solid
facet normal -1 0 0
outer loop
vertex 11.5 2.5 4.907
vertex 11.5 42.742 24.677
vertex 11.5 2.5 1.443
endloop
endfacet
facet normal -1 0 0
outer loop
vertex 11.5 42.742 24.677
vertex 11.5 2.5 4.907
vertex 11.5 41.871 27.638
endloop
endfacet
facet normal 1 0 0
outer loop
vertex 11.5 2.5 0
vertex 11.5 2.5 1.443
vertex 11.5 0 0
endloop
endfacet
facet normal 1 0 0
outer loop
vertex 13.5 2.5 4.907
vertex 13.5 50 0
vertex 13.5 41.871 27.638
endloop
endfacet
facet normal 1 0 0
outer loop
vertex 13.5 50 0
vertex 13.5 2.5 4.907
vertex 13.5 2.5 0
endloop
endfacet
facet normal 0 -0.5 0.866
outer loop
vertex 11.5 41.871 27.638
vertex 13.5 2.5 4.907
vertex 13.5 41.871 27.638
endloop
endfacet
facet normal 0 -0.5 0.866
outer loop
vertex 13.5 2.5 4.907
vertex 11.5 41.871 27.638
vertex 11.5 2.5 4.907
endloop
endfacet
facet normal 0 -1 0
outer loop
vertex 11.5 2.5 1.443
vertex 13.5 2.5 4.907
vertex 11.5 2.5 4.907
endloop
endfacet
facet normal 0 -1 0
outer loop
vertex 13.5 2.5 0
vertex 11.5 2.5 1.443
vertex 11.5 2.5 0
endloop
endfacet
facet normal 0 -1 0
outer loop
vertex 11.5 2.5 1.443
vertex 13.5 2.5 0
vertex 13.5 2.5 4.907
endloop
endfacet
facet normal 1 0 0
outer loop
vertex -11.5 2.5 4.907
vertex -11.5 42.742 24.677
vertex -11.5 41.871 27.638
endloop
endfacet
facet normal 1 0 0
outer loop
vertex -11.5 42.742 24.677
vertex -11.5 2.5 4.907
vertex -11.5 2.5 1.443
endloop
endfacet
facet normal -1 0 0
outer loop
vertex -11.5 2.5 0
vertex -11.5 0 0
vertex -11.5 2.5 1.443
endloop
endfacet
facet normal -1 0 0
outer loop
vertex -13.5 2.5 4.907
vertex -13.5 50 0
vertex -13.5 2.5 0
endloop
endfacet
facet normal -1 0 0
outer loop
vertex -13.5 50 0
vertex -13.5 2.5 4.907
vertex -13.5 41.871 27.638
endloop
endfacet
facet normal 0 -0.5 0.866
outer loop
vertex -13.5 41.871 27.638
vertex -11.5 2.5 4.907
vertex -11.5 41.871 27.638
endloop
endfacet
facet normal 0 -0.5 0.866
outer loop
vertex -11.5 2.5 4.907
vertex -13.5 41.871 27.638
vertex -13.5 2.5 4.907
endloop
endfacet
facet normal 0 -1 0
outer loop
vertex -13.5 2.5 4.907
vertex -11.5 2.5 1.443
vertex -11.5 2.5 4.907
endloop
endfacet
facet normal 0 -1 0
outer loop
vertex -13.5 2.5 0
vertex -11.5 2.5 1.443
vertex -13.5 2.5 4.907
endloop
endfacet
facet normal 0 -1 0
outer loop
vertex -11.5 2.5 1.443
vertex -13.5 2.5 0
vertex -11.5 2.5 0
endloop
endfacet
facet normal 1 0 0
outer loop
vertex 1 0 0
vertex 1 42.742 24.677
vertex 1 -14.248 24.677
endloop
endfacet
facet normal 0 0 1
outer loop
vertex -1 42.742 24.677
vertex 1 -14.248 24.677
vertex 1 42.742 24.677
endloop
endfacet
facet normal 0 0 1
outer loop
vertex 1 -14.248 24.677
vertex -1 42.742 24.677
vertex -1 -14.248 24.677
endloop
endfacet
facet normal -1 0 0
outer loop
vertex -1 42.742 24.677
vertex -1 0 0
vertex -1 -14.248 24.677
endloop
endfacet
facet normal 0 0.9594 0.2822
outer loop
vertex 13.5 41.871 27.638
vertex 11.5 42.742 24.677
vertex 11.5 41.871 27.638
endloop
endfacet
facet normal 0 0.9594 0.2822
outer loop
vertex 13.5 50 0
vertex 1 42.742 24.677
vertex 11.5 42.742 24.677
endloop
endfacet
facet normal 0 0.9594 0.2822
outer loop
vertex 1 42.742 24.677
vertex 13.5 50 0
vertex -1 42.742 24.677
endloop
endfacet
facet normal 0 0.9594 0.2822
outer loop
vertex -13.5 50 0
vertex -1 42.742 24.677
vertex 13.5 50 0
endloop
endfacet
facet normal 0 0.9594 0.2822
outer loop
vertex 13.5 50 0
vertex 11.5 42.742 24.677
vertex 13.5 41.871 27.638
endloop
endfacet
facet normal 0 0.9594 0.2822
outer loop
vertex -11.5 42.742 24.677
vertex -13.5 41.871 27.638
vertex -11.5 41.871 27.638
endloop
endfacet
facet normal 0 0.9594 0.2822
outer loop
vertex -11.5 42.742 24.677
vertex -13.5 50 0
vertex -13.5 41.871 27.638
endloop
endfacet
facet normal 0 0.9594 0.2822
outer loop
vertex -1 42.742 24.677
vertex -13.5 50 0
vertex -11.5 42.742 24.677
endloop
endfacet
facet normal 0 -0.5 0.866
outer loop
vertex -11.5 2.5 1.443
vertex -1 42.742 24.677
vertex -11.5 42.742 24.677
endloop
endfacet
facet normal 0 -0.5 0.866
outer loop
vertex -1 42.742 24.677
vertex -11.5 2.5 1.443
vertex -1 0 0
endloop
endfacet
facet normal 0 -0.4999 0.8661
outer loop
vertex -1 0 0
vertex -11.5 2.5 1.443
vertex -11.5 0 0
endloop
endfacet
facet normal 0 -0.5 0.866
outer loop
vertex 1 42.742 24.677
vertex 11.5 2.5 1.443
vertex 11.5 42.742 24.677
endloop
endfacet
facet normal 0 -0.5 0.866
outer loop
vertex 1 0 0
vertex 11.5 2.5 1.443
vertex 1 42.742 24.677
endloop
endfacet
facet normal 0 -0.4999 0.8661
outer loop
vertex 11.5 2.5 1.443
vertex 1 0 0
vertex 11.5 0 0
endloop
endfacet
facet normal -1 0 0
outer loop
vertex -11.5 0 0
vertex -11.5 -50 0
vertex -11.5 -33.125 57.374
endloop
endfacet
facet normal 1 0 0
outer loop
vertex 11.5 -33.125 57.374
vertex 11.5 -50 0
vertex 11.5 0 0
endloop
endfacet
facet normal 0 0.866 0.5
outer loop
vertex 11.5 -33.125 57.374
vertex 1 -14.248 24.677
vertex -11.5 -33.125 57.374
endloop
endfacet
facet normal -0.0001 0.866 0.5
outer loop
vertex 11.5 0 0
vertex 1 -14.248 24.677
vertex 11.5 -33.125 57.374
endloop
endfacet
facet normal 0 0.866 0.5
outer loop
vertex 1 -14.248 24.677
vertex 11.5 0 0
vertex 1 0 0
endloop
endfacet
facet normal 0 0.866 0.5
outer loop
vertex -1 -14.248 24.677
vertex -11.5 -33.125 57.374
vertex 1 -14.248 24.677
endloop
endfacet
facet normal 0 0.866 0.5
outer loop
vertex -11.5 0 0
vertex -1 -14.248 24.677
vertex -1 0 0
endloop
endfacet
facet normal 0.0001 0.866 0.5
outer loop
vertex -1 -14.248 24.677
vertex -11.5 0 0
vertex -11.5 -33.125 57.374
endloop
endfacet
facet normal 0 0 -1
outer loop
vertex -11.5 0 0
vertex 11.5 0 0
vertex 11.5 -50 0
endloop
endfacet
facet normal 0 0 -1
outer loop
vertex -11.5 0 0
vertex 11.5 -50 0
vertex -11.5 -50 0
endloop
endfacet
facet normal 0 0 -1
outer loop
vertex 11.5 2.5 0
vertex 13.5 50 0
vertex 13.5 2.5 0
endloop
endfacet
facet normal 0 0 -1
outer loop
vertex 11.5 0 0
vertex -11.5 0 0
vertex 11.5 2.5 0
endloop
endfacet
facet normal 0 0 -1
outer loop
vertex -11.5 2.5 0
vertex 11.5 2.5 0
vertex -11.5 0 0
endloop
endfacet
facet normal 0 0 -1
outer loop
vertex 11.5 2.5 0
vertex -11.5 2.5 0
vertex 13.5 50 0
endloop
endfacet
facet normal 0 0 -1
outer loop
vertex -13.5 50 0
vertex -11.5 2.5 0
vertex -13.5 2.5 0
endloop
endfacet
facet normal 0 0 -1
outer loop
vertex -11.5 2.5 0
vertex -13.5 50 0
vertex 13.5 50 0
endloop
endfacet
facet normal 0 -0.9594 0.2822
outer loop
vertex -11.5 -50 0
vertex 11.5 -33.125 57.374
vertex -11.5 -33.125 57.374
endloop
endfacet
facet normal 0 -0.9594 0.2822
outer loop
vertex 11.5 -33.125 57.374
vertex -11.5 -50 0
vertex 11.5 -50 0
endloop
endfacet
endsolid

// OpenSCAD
// laptop measurements
BODY_WIDTH = 10.5;

// angle for center of mass
ANGLE = 30;

module body_ramp()
{
   rotate([ ANGLE, 0, 0 ]) translate([ -BODY_WIDTH-1, 0, -100 ]) cube([ BODY_WIDTH*2+2, 100, 100 ]);
}

module screen_ramp()
{
    rotate([ ANGLE, 0, 0 ]) translate([ -BODY_WIDTH-1, -100, 0 ]) cube([ BODY_WIDTH*2+2, 100, 100 ]);
}

module rail()
{
    difference()
    {
        rotate([ ANGLE, 0, 0 ]) translate([ BODY_WIDTH+1, 0, -97 ]) cube([ 2, 100, 100 ]);
        cube([ 30, 5, 20 ], center = true);
    }
}

module outer_dims()
{
    translate([-15,0,0]) rotate([ 90, 0, 90 ]) linear_extrude(30) polygon(points = [
        [ -50, 0 ], [ 50, 0 ], [ 0, 170 ], // 170mm = height of center of mass, somehow this feels right.
    ]);
}

module wall()
{
    intersection()
    {
        // 49.355 is visually fine-tuned to match with the top of body_ramp.
        cube([ 2, 200, 49.355 ], center = true);
        translate([ -10, 0, 0 ]) outer_dims();
    }
}

module the_rebel()
{
    intersection()
    {
        union()
        {
            body_ramp();
            screen_ramp();
            rail();
            scale([-1,1,1]) rail();
            wall();
        }
        outer_dims();
    }
}

the_rebel();
